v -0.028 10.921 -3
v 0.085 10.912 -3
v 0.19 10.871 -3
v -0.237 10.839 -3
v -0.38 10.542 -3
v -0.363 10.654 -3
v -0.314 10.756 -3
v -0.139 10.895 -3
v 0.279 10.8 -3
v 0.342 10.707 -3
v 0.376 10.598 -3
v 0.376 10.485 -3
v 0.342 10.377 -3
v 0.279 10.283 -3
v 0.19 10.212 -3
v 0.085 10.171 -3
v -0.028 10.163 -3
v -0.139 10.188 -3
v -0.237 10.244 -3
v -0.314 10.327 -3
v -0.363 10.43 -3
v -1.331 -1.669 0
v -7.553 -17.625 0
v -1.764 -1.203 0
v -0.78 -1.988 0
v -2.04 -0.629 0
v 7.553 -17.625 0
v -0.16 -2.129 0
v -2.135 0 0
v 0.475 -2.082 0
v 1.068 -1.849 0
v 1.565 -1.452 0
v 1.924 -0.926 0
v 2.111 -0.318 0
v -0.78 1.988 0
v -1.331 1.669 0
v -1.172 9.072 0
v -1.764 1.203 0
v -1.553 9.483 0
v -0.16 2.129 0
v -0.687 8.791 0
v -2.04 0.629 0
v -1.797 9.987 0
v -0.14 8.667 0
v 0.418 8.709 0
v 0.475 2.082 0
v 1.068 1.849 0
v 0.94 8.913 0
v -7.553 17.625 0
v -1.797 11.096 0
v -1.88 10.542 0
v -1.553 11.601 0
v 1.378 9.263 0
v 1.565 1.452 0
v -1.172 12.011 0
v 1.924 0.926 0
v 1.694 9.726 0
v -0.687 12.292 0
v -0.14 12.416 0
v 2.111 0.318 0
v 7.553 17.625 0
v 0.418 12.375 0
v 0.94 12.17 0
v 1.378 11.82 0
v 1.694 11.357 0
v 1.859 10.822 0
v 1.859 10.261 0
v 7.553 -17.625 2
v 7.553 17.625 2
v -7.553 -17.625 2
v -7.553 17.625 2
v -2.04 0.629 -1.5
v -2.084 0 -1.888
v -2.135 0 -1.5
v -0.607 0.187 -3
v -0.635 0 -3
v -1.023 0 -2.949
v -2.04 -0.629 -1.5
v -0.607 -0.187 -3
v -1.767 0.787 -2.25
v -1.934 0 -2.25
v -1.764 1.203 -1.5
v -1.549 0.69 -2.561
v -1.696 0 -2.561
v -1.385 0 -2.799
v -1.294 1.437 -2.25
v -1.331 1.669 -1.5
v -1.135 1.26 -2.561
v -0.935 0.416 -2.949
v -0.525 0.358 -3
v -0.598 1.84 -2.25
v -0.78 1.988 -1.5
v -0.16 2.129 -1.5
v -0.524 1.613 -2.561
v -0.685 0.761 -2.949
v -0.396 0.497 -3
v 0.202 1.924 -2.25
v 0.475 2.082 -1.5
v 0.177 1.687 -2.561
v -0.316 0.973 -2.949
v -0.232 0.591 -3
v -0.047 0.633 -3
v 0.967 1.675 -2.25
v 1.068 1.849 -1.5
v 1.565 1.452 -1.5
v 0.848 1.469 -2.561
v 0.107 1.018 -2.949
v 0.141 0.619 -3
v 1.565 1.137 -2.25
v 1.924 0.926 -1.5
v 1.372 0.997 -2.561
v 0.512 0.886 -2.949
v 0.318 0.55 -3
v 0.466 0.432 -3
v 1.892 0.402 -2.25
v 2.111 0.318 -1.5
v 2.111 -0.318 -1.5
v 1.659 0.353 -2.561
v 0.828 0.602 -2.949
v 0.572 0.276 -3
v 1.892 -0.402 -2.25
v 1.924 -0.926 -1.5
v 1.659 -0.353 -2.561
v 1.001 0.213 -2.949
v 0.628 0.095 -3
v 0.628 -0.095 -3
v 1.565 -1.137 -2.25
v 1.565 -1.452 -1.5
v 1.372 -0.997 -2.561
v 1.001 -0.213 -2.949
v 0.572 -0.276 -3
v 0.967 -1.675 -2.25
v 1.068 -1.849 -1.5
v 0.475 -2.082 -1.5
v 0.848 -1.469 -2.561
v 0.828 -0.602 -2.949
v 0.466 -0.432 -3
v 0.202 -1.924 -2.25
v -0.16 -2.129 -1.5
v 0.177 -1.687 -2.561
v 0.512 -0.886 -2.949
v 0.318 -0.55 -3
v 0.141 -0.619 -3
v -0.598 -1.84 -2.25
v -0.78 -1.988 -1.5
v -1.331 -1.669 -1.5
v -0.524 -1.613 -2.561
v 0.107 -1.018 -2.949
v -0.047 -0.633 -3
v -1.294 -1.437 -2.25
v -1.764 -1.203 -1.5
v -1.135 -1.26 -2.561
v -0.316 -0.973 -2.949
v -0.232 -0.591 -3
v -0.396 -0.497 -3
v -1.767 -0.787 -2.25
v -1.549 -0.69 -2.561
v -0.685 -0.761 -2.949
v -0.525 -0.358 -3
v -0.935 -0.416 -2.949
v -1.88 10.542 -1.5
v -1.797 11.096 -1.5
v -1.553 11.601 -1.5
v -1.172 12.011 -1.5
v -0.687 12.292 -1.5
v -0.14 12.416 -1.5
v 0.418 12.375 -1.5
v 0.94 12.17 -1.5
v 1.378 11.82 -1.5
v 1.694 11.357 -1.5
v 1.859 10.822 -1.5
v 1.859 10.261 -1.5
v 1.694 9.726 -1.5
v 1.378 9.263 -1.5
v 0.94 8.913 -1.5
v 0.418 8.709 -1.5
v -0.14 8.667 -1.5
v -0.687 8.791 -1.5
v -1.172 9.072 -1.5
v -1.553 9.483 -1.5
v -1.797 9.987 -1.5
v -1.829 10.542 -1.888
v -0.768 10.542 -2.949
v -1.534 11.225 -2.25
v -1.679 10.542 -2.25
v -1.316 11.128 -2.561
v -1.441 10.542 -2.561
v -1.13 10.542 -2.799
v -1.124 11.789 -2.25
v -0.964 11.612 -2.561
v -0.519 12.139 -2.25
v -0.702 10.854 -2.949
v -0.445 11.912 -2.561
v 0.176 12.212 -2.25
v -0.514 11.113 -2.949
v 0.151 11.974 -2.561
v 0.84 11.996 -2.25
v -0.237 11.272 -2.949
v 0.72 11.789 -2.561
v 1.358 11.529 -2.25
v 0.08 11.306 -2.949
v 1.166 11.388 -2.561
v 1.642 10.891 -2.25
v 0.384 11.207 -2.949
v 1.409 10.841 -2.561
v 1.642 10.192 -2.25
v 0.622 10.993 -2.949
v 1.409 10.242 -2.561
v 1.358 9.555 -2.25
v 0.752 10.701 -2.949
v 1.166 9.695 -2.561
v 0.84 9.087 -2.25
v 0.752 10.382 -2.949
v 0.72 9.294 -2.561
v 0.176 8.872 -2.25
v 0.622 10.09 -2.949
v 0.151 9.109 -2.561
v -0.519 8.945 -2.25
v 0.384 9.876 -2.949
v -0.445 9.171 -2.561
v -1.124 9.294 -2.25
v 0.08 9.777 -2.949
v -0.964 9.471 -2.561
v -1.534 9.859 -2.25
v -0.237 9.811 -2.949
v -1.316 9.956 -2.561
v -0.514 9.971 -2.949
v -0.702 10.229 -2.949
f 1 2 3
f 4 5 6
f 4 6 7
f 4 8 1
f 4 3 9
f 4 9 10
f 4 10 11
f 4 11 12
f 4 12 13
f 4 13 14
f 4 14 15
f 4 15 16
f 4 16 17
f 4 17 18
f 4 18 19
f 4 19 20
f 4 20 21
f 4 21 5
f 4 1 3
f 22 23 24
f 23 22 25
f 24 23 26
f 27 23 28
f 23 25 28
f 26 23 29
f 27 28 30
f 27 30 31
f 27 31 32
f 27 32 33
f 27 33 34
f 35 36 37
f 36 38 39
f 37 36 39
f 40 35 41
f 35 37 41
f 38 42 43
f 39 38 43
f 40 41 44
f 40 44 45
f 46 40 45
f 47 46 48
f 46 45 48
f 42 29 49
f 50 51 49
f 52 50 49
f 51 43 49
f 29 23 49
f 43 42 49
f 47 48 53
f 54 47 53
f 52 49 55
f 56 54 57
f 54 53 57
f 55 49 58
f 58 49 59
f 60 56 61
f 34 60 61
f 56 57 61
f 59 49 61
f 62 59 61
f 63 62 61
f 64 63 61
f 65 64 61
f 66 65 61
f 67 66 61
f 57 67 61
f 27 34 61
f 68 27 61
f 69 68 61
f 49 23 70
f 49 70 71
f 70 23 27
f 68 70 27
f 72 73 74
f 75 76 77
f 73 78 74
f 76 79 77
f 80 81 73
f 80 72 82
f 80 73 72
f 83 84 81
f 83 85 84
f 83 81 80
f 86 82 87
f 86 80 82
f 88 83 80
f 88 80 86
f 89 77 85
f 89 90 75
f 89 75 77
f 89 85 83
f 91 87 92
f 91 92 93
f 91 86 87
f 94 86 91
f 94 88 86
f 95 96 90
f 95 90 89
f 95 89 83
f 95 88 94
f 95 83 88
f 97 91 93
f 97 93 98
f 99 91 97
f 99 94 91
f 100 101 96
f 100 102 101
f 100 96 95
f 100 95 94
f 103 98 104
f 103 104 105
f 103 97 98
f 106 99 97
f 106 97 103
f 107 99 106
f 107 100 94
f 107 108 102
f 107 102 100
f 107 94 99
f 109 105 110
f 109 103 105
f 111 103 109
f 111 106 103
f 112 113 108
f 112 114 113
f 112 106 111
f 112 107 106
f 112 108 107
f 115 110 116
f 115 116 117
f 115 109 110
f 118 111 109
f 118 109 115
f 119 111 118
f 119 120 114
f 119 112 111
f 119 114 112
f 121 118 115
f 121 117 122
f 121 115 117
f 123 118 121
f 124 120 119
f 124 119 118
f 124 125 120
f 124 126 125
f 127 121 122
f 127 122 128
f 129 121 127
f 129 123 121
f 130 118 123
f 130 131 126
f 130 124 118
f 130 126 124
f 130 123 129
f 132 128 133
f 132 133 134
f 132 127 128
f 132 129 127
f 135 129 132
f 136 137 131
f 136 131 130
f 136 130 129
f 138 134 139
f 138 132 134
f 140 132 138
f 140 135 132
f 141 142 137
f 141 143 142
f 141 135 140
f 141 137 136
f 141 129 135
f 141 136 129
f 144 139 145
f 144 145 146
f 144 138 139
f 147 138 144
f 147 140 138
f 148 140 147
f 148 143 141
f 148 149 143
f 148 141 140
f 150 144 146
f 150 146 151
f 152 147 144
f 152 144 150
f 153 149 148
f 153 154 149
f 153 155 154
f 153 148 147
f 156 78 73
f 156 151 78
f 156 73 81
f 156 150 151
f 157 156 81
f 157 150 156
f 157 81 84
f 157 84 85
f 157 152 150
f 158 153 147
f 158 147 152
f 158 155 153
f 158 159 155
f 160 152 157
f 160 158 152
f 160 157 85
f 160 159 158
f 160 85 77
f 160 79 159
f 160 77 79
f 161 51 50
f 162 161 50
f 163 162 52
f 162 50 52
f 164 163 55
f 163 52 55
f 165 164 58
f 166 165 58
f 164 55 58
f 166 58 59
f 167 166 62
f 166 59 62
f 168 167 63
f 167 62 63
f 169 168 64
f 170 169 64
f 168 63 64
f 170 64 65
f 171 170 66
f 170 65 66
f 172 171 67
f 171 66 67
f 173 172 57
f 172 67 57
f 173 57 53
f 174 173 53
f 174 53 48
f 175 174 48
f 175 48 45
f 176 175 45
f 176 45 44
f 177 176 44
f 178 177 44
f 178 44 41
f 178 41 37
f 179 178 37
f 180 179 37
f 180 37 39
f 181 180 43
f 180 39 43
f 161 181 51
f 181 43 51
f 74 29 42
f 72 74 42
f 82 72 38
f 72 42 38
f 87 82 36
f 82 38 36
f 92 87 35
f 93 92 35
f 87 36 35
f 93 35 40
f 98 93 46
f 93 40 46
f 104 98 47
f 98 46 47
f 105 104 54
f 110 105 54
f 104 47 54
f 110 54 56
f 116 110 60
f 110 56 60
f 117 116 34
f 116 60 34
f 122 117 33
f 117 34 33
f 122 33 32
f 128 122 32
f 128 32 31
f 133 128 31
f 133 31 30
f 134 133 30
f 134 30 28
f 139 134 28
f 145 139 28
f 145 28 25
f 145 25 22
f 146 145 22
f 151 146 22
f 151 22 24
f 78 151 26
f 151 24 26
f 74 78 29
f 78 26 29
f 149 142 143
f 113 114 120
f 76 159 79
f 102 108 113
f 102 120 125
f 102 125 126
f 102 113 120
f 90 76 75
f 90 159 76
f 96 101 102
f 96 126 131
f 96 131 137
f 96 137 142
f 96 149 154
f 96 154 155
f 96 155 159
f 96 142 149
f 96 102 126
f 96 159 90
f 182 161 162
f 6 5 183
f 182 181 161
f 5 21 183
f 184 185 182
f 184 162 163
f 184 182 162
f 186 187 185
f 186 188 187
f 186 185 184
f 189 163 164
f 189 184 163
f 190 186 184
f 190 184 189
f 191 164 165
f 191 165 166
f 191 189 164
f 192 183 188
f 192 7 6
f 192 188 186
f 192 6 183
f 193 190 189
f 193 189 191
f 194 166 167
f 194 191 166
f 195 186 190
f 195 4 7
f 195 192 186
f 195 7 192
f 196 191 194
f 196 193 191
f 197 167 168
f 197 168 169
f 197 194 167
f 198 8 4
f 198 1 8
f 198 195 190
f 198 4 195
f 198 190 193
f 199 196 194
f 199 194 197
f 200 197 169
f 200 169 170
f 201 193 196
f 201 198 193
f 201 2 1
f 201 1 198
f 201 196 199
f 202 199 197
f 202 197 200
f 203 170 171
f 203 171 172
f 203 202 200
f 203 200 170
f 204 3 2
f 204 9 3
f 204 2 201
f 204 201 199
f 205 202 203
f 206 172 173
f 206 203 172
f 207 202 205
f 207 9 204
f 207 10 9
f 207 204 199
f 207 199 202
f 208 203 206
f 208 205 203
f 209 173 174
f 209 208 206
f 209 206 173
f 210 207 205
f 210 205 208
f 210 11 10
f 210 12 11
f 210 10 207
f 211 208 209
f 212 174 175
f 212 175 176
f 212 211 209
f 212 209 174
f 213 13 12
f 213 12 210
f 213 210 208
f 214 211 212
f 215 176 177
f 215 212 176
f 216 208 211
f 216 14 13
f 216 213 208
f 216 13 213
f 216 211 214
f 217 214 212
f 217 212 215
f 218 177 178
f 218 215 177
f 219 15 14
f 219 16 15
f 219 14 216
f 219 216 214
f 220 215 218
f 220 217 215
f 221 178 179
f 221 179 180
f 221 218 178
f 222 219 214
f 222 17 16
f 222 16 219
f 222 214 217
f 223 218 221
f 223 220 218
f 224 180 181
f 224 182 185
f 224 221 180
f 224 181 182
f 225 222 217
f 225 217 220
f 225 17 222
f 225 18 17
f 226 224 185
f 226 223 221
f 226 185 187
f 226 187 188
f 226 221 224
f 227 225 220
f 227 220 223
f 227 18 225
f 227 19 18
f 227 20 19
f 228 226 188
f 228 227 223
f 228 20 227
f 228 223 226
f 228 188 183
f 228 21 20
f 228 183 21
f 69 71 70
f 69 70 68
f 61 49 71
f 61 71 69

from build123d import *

# Parameters (mm, degrees)
SKETCH1_W           = 15.106784102
SKETCH1_H           = 35.249746584
BOSS_EXTRUDE1_DEPTH = 2
SKETCH2_R           = 1.880080874
SKETCH2_R_2         = 2.135178256
BOSS_EXTRUDE2_DEPTH = 3
FILLET1_R           = 1.5


with BuildPart() as part:
    # Sketch1 → Boss-Extrude1 (new body)
    with BuildSketch(Plane.XY):
        Rectangle(SKETCH1_W, SKETCH1_H)
    extrude(amount=BOSS_EXTRUDE1_DEPTH)

    # Sketch2 → Boss-Extrude2 (add)
    with BuildSketch(Plane(origin=(0, 0, 0), x_dir=(-1, 0, 0), z_dir=(0, 0, -1))):
        with Locations((0, 10.541590628)):
            Circle(SKETCH2_R)
        Circle(SKETCH2_R_2)
    extrude(amount=BOSS_EXTRUDE2_DEPTH)

    # Fillet1
    fillet1_edges = [part.edges().sort_by_distance(p)[0] for p in [
        (1.880080874, 10.541590628, -3),
        (2.135178256, 0, -3),
    ]]
    fillet(fillet1_edges, radius=FILLET1_R)


solid = part.part
